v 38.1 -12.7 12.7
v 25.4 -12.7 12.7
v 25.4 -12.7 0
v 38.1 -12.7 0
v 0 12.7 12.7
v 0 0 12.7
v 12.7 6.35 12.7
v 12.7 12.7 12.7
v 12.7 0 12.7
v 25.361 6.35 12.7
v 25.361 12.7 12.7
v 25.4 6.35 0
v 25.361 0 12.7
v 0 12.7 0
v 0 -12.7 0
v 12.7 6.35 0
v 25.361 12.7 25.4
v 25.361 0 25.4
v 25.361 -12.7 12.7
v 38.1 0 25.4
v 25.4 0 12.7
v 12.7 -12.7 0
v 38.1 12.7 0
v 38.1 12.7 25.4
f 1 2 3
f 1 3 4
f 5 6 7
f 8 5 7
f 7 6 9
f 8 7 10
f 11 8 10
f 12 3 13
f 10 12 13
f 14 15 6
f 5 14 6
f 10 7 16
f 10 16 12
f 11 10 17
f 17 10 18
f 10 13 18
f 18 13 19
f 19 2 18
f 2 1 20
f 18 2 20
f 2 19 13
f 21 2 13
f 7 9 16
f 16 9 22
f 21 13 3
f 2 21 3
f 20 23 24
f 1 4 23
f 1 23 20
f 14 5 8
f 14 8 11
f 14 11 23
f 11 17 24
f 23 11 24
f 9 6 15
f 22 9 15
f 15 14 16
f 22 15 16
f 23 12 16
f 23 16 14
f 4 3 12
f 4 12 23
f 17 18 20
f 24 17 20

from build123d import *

# Parameters (mm, degrees)
F0_W     = 38.1
F0_H     = 25.4
F1_DEPTH = 12.7
F3_DEPTH = 19.05
F2_W     = 12.660892
F2_H     = 12.70006
F4_DEPTH = 25.401
F6_DEPTH = 25.4
F8_DEPTH = 38.101


with BuildPart() as f1:
    # F0 (on Front) → F1 (new body, symmetric)
    with BuildSketch(Plane.XZ):
        with Locations((19.05, 12.7)):
            Rectangle(F0_W, F0_H)
    extrude(amount=F1_DEPTH, both=True)

    # F2 (on face) → F3 (cut)
    with BuildSketch(Plane.XZ.offset(12.7)):
        Polygon((25.360892, 12.69994), (12.7, 12.69994), (12.7, 0), (25.4, 0), align=None)
    extrude(amount=-F3_DEPTH, mode=Mode.SUBTRACT)

    # F2 (on face) → F4 (cut, through all)
    with BuildSketch(Plane.XZ.offset(12.7)):
        with Locations((19.030446, 19.04997)):
            Rectangle(F2_W, F2_H)
        Polygon((12.7, 25.4), (0, 25.4), (0, 12.7), (12.7, 12.69994), align=None)
    extrude(amount=-F4_DEPTH, mode=Mode.SUBTRACT)

    # F5 (on face) → F6 (cut)
    with BuildSketch(Plane(origin=(0, 0, 0), x_dir=(0, -1, 0), z_dir=(-1, 0, 0))):
        Polygon((12.7, 12.7), (0, 12.7), (12.7, 0), align=None)
    extrude(amount=-F6_DEPTH, mode=Mode.SUBTRACT)

    # F7 (on face) → F8 (cut, through all)
    with BuildSketch(Plane.YZ.offset(38.1)):
        Polygon((-12.7, 12.7), (0, 25.4), (-12.7, 25.4), align=None)
    extrude(amount=-F8_DEPTH, mode=Mode.SUBTRACT)


solid = f1.part
